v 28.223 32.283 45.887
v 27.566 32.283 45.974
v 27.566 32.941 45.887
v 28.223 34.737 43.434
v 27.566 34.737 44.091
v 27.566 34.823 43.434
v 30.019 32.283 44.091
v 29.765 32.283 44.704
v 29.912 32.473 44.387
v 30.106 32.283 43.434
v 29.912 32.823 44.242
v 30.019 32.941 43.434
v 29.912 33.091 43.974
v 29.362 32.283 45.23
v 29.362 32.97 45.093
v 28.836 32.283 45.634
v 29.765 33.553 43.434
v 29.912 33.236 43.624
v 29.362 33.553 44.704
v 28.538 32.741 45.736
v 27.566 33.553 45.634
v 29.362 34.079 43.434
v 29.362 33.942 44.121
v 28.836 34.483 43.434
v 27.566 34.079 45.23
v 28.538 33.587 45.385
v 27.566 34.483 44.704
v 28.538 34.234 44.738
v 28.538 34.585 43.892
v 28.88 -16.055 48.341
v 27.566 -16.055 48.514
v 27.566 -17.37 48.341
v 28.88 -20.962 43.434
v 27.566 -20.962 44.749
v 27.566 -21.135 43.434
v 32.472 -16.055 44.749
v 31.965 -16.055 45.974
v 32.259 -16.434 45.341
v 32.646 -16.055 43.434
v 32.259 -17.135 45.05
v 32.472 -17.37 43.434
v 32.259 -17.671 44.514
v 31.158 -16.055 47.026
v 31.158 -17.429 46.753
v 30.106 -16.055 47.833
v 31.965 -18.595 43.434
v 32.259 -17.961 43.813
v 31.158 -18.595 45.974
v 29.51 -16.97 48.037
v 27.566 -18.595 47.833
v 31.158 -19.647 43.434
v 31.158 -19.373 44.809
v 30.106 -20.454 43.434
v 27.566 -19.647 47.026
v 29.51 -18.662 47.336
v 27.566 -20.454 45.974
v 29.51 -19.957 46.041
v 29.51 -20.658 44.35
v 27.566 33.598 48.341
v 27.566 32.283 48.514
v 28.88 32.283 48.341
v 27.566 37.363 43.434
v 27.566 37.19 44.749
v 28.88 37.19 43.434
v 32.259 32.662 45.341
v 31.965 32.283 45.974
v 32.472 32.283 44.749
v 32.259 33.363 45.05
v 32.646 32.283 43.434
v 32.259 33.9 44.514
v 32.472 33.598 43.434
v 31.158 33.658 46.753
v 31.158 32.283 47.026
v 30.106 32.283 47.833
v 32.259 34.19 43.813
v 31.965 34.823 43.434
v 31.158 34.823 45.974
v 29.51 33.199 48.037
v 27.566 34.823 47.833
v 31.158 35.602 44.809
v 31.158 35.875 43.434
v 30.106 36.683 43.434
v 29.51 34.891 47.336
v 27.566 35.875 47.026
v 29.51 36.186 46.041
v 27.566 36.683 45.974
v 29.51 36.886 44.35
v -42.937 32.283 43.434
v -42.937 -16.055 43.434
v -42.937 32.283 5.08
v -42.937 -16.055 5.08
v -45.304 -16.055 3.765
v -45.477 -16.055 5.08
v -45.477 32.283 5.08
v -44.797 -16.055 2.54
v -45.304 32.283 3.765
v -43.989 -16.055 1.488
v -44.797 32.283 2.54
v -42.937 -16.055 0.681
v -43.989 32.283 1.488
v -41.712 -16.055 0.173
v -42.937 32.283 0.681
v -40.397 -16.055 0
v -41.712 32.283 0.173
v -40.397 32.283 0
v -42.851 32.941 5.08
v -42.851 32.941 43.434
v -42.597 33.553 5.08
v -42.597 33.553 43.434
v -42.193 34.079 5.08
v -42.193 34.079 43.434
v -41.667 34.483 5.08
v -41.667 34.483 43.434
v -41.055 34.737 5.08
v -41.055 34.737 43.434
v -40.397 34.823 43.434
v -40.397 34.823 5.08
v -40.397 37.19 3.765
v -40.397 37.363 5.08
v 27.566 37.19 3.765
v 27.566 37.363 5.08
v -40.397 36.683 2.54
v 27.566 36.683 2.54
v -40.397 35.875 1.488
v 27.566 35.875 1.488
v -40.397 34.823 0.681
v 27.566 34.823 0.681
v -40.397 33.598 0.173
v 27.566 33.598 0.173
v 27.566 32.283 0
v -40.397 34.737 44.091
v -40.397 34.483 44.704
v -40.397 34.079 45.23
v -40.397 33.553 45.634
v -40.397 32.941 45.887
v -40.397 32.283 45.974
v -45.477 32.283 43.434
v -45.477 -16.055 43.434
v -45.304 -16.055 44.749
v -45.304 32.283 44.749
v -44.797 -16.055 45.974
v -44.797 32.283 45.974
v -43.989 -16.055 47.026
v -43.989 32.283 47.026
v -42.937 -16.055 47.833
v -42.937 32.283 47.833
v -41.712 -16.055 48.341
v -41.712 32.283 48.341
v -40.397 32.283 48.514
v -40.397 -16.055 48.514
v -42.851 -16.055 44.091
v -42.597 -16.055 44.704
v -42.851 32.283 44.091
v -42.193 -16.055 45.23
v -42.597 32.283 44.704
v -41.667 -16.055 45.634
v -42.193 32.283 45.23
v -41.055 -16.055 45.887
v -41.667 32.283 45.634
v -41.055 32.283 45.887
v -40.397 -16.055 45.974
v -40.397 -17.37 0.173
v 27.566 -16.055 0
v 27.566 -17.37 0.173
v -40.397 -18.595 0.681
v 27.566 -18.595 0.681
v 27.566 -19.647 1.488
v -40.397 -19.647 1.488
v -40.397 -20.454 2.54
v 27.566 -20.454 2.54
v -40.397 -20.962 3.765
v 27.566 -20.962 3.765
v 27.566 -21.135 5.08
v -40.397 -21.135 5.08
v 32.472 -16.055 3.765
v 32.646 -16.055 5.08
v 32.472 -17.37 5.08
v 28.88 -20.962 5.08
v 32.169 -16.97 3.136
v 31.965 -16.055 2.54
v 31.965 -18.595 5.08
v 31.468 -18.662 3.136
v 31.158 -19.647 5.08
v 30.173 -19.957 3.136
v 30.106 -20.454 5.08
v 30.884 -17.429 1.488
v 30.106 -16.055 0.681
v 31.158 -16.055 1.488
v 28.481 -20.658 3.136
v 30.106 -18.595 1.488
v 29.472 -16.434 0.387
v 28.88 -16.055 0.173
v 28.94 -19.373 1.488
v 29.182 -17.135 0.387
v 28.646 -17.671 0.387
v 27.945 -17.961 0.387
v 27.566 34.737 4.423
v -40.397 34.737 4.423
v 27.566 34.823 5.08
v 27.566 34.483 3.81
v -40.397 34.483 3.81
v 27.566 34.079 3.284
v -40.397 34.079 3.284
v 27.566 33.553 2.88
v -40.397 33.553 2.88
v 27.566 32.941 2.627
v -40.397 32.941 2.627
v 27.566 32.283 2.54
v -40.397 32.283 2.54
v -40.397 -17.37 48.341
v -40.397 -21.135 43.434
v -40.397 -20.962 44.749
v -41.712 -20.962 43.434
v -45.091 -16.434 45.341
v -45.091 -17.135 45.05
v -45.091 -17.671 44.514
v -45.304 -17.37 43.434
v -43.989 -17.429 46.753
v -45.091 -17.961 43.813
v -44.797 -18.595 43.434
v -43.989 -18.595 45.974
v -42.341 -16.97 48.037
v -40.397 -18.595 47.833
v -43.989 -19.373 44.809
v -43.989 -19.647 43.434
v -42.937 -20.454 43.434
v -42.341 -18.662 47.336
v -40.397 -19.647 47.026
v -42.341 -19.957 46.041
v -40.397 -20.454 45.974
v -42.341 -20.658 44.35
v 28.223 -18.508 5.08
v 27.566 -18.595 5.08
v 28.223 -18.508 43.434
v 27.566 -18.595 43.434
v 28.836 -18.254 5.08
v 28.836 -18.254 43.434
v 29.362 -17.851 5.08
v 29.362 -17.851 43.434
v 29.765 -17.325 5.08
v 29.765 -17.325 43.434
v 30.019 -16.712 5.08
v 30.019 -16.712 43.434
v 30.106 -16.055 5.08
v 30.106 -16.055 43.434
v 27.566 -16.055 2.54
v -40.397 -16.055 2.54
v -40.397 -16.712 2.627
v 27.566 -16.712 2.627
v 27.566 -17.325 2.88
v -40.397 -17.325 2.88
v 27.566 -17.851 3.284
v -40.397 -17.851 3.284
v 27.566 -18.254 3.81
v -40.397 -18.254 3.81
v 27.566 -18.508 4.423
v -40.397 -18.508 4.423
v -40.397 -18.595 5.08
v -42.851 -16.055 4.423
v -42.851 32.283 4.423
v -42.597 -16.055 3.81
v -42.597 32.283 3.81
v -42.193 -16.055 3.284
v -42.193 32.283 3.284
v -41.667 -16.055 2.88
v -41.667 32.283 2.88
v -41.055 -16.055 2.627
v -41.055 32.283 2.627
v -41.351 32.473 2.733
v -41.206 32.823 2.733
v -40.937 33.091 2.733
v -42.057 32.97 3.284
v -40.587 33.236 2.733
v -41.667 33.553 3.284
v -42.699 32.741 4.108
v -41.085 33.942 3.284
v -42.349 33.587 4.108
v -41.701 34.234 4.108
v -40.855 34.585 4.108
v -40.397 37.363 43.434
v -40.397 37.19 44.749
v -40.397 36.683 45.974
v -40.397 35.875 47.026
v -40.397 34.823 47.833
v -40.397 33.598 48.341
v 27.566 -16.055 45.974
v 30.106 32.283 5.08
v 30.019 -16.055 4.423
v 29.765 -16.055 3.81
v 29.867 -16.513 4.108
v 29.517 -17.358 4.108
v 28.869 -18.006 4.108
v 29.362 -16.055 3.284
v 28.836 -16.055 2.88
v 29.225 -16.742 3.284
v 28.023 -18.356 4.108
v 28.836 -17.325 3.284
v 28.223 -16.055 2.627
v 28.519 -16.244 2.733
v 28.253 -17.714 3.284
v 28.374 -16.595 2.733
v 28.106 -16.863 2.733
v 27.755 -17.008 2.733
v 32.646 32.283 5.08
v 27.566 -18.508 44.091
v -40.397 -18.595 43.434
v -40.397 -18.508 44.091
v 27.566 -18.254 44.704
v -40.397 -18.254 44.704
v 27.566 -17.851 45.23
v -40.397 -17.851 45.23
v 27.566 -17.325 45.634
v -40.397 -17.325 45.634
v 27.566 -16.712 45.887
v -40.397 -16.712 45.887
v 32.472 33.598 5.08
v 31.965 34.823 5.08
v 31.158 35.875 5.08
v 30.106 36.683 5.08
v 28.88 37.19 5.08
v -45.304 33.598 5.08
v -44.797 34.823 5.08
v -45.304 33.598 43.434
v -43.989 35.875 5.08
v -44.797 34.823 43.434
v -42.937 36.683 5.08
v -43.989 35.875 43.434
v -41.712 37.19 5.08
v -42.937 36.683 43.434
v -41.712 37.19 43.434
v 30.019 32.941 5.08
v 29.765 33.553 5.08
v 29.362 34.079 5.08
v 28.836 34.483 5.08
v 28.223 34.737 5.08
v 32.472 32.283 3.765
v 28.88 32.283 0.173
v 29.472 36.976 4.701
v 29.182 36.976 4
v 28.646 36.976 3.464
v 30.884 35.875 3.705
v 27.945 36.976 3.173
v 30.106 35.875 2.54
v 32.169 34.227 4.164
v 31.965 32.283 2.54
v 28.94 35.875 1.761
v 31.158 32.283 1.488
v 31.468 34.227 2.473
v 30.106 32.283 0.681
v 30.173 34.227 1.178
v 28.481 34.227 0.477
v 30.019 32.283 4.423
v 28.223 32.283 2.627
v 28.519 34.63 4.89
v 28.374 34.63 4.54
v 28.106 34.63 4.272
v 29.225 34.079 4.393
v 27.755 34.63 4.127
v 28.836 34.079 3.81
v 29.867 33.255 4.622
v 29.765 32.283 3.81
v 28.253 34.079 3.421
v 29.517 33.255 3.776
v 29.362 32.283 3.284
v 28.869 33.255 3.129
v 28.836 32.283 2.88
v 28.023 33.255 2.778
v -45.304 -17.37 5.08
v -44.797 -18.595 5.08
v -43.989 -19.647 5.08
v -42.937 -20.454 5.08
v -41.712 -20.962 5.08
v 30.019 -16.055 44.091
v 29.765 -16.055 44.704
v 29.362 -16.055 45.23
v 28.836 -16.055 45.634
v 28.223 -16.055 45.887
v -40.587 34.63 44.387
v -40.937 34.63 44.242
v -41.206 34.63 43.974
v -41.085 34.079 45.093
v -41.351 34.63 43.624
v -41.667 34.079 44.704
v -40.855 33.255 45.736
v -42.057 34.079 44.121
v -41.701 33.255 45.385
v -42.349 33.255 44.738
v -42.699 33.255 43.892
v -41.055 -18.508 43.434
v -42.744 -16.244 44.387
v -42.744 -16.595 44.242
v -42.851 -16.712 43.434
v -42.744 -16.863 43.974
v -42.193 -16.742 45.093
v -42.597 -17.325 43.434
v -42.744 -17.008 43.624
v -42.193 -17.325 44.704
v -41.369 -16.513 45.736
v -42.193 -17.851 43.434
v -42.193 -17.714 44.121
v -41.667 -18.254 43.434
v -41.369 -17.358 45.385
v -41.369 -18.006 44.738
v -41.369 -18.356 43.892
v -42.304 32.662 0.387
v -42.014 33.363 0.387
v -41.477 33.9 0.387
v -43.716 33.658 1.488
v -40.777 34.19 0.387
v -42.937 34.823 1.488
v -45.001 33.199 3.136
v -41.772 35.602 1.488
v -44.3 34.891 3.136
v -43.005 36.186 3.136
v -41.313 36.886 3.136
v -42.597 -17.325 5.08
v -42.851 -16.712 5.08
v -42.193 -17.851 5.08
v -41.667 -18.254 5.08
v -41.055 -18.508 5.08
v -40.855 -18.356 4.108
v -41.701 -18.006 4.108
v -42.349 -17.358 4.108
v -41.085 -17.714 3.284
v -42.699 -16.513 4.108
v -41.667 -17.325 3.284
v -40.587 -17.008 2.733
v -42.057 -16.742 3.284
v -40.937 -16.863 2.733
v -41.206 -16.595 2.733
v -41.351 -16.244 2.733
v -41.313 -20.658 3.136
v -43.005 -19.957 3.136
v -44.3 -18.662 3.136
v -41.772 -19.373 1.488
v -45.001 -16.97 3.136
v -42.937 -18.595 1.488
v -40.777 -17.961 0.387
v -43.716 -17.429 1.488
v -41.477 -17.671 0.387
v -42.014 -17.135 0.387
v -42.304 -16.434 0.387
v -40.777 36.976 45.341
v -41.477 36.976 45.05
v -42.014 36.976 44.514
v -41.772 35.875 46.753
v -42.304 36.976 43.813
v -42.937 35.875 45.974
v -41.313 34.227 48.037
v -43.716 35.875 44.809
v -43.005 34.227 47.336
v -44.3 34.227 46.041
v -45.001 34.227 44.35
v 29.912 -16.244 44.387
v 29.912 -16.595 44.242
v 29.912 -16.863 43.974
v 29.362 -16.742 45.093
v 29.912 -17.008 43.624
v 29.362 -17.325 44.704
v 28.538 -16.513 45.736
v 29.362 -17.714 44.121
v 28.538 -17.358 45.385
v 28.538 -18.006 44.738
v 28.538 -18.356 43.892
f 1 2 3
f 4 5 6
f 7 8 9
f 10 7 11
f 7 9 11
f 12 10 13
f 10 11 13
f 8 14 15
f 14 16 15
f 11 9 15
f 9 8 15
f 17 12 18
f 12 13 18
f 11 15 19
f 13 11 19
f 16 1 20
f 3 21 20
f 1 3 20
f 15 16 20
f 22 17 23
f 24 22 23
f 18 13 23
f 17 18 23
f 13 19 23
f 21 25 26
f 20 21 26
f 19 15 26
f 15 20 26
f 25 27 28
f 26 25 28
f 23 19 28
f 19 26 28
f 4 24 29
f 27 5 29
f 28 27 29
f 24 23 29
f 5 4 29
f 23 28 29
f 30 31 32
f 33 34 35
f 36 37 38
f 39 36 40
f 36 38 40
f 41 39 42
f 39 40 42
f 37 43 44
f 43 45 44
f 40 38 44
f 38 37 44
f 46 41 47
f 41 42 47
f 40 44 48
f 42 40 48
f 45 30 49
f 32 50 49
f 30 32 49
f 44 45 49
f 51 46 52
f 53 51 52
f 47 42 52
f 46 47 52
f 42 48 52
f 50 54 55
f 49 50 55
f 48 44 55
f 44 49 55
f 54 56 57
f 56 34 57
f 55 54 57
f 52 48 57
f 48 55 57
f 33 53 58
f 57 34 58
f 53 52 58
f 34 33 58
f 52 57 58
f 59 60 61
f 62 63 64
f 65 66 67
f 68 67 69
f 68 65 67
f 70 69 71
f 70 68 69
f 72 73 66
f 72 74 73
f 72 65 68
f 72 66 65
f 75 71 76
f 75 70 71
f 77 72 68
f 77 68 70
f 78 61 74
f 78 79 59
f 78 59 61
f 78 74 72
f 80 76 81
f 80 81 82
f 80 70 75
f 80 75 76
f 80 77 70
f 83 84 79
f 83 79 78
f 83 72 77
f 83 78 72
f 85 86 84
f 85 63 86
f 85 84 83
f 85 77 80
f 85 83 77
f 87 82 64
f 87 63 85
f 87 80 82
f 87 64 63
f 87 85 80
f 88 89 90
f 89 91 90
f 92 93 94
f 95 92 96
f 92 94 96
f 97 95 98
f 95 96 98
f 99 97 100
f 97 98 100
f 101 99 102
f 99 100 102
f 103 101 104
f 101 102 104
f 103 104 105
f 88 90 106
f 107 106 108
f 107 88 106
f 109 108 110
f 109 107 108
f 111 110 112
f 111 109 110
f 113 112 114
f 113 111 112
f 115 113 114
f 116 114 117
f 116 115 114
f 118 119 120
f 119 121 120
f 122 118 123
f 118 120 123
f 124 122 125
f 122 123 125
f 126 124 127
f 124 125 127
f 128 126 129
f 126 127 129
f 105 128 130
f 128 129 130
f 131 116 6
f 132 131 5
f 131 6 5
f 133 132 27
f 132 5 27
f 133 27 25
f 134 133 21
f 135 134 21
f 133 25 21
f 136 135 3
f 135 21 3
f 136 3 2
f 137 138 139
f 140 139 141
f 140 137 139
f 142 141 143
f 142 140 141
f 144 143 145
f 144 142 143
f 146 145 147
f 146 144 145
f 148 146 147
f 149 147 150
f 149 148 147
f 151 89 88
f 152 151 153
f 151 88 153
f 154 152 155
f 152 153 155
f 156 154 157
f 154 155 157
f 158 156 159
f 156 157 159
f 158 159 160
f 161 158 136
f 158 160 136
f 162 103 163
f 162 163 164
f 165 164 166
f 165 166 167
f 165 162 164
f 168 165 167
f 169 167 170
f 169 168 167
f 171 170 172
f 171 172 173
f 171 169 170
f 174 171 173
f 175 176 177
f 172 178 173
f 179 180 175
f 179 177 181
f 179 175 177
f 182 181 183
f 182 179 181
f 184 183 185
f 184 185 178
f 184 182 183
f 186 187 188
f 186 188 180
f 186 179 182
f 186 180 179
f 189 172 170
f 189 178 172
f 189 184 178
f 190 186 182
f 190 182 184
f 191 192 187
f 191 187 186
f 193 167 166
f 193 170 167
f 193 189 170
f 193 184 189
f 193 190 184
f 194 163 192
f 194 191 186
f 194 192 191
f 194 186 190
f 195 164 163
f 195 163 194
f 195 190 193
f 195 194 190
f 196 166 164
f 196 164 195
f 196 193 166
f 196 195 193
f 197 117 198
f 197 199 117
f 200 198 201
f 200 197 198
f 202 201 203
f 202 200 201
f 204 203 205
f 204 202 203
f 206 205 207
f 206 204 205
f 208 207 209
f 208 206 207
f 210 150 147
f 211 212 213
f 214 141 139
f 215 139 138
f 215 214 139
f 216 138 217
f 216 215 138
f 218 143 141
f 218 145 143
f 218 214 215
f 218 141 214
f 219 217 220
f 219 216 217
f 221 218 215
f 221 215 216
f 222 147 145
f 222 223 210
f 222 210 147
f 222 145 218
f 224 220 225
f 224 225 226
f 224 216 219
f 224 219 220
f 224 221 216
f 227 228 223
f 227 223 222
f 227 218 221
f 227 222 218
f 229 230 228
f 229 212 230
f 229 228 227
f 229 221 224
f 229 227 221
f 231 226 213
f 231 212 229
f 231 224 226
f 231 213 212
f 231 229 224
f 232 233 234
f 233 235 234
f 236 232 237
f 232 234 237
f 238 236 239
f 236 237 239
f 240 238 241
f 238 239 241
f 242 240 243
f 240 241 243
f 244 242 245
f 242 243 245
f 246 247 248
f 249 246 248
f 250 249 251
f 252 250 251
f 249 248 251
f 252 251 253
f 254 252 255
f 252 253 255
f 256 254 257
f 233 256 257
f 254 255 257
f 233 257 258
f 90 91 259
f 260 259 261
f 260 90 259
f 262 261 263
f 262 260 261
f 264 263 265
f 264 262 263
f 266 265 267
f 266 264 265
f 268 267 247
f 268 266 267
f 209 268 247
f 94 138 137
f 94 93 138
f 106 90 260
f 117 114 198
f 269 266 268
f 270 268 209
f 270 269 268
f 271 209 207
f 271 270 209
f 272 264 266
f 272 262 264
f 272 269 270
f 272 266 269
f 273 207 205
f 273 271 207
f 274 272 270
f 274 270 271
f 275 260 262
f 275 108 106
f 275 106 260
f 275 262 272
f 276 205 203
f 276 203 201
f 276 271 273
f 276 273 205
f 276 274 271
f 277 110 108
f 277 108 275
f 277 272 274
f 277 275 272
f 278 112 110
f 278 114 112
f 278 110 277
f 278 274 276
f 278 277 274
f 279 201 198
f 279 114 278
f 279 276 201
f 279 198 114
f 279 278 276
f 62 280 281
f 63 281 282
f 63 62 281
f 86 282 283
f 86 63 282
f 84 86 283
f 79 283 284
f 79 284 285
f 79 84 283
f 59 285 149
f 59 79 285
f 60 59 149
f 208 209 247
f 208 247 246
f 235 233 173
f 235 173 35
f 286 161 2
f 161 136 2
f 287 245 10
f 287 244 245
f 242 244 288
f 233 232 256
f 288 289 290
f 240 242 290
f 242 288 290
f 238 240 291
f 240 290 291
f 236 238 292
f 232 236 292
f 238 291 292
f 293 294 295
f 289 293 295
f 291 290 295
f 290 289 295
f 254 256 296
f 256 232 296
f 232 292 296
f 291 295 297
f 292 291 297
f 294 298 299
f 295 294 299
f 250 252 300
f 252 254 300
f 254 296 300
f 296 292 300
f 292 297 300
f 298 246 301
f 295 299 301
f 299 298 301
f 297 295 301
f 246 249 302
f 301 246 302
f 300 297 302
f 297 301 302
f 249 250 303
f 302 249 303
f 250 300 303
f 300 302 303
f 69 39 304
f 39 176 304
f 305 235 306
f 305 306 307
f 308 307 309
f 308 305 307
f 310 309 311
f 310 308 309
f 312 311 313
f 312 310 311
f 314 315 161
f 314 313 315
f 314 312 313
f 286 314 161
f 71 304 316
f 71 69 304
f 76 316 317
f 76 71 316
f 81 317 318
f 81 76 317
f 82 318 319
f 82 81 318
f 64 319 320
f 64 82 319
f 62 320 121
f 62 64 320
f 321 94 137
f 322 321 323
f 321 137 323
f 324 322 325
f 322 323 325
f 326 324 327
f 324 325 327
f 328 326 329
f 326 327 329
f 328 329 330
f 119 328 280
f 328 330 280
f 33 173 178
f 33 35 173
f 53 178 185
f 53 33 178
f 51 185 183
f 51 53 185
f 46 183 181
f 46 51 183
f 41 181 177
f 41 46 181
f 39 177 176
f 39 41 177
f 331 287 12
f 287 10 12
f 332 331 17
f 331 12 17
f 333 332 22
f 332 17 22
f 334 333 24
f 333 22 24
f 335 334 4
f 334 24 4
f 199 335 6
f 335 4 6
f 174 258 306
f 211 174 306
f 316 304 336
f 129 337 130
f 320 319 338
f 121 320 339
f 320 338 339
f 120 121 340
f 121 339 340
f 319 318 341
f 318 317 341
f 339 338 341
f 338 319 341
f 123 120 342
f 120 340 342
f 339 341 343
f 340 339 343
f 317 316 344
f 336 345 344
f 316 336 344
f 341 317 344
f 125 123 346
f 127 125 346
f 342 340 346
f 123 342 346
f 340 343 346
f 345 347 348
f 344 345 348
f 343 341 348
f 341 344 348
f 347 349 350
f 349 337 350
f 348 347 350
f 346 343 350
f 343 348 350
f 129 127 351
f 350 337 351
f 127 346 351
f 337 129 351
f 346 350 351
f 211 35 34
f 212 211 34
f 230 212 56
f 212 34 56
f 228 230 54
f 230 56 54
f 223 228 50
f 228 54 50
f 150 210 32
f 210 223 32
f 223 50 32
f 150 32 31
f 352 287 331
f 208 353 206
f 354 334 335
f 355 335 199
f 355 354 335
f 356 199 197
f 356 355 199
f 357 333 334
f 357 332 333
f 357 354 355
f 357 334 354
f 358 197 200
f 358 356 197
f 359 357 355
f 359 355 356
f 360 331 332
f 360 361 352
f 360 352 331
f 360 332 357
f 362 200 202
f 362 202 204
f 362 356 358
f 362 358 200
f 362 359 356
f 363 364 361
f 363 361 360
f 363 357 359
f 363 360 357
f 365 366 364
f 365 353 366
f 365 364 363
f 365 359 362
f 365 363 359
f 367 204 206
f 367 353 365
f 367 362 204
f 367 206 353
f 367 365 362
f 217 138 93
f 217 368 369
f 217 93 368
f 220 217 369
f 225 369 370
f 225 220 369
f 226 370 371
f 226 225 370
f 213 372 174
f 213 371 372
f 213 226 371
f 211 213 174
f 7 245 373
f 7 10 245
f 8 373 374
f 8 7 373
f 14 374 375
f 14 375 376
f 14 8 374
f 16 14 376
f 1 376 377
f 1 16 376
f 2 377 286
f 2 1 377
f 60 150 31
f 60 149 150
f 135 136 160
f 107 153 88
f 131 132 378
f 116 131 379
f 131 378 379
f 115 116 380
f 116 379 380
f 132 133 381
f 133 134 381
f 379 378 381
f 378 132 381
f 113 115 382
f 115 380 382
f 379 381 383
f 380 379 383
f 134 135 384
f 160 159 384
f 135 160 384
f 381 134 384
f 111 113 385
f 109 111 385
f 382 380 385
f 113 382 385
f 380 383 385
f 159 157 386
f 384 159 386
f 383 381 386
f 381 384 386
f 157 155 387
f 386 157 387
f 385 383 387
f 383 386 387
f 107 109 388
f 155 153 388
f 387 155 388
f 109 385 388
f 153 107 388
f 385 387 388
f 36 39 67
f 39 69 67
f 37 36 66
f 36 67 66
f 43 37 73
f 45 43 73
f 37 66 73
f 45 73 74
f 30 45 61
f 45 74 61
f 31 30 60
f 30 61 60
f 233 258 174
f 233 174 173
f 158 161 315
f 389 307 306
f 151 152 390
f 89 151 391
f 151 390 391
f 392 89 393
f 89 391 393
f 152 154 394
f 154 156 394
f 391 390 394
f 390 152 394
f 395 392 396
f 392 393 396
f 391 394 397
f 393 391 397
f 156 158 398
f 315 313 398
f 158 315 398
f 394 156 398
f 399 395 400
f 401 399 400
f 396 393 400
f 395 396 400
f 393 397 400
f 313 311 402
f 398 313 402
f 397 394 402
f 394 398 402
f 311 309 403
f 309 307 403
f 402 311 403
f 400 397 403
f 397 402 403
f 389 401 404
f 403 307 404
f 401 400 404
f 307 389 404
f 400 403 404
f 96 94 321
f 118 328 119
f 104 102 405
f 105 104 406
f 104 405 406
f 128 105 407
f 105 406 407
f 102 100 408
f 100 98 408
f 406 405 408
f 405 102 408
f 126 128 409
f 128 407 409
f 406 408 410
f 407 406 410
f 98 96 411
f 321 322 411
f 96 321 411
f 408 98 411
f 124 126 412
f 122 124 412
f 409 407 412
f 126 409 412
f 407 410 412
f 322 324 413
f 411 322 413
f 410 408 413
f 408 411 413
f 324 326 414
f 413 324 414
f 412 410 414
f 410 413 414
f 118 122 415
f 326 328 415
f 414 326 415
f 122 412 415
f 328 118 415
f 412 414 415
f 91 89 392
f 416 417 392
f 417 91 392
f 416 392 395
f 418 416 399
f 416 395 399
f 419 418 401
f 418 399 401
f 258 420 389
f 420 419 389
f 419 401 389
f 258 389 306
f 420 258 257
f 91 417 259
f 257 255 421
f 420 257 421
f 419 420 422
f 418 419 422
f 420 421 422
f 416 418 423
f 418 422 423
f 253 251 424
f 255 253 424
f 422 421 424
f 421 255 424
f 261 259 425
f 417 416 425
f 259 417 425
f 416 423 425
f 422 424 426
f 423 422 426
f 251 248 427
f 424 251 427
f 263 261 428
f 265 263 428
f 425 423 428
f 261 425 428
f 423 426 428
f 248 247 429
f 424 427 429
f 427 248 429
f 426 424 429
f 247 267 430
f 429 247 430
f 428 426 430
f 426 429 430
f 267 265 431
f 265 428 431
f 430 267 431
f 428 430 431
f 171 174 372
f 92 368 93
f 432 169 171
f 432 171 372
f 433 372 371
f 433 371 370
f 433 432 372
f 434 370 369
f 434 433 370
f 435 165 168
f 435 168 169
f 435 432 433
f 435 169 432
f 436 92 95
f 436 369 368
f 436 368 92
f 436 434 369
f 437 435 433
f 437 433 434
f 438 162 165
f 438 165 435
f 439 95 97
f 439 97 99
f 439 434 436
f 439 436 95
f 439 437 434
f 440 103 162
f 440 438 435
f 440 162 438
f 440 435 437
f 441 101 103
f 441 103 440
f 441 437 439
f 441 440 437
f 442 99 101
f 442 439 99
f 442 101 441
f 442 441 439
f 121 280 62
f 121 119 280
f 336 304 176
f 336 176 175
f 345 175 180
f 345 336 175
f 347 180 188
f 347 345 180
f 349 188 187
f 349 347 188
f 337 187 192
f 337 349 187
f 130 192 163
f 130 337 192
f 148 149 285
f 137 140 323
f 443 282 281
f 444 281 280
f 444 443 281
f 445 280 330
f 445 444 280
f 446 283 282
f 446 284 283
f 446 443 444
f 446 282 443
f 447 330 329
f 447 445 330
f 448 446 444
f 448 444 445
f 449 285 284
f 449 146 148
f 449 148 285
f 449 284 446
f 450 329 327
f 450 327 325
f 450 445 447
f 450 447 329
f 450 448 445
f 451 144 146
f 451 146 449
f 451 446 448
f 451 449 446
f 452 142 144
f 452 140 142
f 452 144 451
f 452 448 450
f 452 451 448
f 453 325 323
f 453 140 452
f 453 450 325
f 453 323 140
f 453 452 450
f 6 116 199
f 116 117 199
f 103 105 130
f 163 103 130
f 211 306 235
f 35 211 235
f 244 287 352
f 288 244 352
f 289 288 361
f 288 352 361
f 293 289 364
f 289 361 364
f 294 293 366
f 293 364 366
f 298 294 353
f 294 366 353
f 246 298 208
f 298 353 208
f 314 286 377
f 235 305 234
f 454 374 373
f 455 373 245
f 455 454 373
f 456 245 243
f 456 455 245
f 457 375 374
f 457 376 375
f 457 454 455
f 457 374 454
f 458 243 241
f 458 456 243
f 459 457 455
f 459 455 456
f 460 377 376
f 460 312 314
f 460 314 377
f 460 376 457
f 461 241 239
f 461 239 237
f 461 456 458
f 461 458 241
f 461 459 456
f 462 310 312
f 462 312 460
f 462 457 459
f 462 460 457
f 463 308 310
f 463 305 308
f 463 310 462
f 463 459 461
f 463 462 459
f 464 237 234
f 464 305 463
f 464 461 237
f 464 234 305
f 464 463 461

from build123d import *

# Parameters (mm, degrees)
F0_W         = 78.1229734421
F0_H         = 58.4978777915
F1_DEPTH     = 48.514
F2_R         = 5.08
F3_T1_DEPTH  = 67.9629734421
F3_S5_W      = 5.08
F3_S5_H      = 5.08
F3_T6_DEPTH  = 5.08
F3_S11_W     = 5.08
F3_S11_H     = 5.08
F3_T12_DEPTH = 5.08
F4_T         = -2.54


# Not quite as in the source:
# - a fillet or chamfer that OpenCascade refuses, or shapes differently, is made with other operations: its cross-section is extruded or revolved along the edge and cut away or added
# - a shell that OpenCascade refuses in one call is made with other operations: the cavity is built on its own and cut out


with BuildPart() as f1:
    # F0 (on Top) → F1 (new body)
    with BuildSketch(Plane.XY):
        with Locations((-6.4158961177, 8.1142215058)):
            Rectangle(F0_W, F0_H)
    extrude(amount=F1_DEPTH)

    # F2
    f2_edges = [f1.edges().sort_by_distance(p)[0] for p in [
        (-6.415896, -21.134717, 48.514),
        (-45.477383, 8.114222, 48.514),
        (-6.415896, 37.36316, 48.514),
        (32.645591, 8.114222, 48.514),
        (32.645591, -21.134717, 24.257),
        (32.645591, 8.114222, 0),
        (32.645591, 37.36316, 24.257),
        (-45.477383, -21.134717, 24.257),
        (-45.477383, 37.36316, 24.257),
        (-45.477383, 8.114222, 0),
        (-6.415896, 37.36316, 0),
    ]]
    fillet(f2_edges, radius=F2_R)

    # F3: fillet of radius 5.08 on 1 edges, made by hand

    # F3_s2 → F3_t1 (cut)
    with BuildSketch(Plane.YZ.offset(-40.3973828387)):
        with BuildLine():
            ThreePointArc((-16.0547173899, 0), (-19.6468198384, 1.4878975516), (-21.1347173899, 5.08))
            Line((-21.1347173899, 5.08), (-21.1347173899, 0))
            Line((-21.1347173899, 0), (-16.0547173899, 0))
        make_face()
    extrude(amount=F3_T1_DEPTH, mode=Mode.SUBTRACT)


with BuildPart() as f3_tool4:
    # F3_s5 → F3_t6 (new body)
    with BuildSketch(Plane.XY.offset(5.08)):
        with Locations((-42.9373828387, -18.5947173899)):
            Rectangle(F3_S5_W, F3_S5_H)
    extrude(amount=-F3_T6_DEPTH)

    # F3_s7 → F3_t8 (revolve, cut)
    with BuildSketch(Plane(origin=(-40.3973828387, -16.0547173899, 5.08), x_dir=(0.7071067812, 0.7071067812, 0), z_dir=(-0.7071067812, 0.7071067812, 0))):
        with BuildLine():
            ThreePointArc((0, -5.08), (5.08, 0), (0, 5.08))
            Line((0, 5.08), (0, -5.08))
        make_face()
    revolve(axis=Axis((-40.3973828387, -16.0547173899, 5.08), (0, 0, -1)), mode=Mode.SUBTRACT)


with BuildPart() as f1_1:
    add(f1.part)

    # F3_t3: cut F3_tool4
    add(f3_tool4.part, mode=Mode.SUBTRACT)


with BuildPart() as f3_tool10:
    # F3_s11 → F3_t12 (new body)
    with BuildSketch(Plane.XY.offset(5.08)):
        with Locations((30.1055906034, -18.5947173899)):
            Rectangle(F3_S11_W, F3_S11_H)
    extrude(amount=-F3_T12_DEPTH)

    # F3_s13 → F3_t14 (revolve, cut)
    with BuildSketch(Plane(origin=(27.5655906034, -16.0547173899, 5.08), x_dir=(-0.7071067812, 0.7071067812, 0), z_dir=(-0.7071067812, -0.7071067812, 0))):
        with BuildLine():
            ThreePointArc((0, -5.08), (5.08, 0), (0, 5.08))
            Line((0, 5.08), (0, -5.08))
        make_face()
    revolve(axis=Axis((27.5655906034, -16.0547173899, 5.08), (0, 0, -1)), mode=Mode.SUBTRACT)


with BuildPart() as f1_2:
    add(f1_1.part)

    # F3_t9: cut F3_tool10
    add(f3_tool10.part, mode=Mode.SUBTRACT)

    # F4: a shell. OpenCascade refuses it in one call, so the cavity is built on its own and cut out:
    # the body offset inwards by the wall thickness, plus a prism from it out through each open face.
    f4_core = offset(f1_2.part, amount=F4_T, mode=Mode.PRIVATE)
    f4_exits = [f4_core.faces().sort_by_distance(p)[0] for p in [
        (-6.415896, -18.594717, 24.257),
    ]]
    add(f4_core, mode=Mode.SUBTRACT)
    extrude(f4_exits, amount=-F4_T, mode=Mode.SUBTRACT)


solid = f1_2.part
